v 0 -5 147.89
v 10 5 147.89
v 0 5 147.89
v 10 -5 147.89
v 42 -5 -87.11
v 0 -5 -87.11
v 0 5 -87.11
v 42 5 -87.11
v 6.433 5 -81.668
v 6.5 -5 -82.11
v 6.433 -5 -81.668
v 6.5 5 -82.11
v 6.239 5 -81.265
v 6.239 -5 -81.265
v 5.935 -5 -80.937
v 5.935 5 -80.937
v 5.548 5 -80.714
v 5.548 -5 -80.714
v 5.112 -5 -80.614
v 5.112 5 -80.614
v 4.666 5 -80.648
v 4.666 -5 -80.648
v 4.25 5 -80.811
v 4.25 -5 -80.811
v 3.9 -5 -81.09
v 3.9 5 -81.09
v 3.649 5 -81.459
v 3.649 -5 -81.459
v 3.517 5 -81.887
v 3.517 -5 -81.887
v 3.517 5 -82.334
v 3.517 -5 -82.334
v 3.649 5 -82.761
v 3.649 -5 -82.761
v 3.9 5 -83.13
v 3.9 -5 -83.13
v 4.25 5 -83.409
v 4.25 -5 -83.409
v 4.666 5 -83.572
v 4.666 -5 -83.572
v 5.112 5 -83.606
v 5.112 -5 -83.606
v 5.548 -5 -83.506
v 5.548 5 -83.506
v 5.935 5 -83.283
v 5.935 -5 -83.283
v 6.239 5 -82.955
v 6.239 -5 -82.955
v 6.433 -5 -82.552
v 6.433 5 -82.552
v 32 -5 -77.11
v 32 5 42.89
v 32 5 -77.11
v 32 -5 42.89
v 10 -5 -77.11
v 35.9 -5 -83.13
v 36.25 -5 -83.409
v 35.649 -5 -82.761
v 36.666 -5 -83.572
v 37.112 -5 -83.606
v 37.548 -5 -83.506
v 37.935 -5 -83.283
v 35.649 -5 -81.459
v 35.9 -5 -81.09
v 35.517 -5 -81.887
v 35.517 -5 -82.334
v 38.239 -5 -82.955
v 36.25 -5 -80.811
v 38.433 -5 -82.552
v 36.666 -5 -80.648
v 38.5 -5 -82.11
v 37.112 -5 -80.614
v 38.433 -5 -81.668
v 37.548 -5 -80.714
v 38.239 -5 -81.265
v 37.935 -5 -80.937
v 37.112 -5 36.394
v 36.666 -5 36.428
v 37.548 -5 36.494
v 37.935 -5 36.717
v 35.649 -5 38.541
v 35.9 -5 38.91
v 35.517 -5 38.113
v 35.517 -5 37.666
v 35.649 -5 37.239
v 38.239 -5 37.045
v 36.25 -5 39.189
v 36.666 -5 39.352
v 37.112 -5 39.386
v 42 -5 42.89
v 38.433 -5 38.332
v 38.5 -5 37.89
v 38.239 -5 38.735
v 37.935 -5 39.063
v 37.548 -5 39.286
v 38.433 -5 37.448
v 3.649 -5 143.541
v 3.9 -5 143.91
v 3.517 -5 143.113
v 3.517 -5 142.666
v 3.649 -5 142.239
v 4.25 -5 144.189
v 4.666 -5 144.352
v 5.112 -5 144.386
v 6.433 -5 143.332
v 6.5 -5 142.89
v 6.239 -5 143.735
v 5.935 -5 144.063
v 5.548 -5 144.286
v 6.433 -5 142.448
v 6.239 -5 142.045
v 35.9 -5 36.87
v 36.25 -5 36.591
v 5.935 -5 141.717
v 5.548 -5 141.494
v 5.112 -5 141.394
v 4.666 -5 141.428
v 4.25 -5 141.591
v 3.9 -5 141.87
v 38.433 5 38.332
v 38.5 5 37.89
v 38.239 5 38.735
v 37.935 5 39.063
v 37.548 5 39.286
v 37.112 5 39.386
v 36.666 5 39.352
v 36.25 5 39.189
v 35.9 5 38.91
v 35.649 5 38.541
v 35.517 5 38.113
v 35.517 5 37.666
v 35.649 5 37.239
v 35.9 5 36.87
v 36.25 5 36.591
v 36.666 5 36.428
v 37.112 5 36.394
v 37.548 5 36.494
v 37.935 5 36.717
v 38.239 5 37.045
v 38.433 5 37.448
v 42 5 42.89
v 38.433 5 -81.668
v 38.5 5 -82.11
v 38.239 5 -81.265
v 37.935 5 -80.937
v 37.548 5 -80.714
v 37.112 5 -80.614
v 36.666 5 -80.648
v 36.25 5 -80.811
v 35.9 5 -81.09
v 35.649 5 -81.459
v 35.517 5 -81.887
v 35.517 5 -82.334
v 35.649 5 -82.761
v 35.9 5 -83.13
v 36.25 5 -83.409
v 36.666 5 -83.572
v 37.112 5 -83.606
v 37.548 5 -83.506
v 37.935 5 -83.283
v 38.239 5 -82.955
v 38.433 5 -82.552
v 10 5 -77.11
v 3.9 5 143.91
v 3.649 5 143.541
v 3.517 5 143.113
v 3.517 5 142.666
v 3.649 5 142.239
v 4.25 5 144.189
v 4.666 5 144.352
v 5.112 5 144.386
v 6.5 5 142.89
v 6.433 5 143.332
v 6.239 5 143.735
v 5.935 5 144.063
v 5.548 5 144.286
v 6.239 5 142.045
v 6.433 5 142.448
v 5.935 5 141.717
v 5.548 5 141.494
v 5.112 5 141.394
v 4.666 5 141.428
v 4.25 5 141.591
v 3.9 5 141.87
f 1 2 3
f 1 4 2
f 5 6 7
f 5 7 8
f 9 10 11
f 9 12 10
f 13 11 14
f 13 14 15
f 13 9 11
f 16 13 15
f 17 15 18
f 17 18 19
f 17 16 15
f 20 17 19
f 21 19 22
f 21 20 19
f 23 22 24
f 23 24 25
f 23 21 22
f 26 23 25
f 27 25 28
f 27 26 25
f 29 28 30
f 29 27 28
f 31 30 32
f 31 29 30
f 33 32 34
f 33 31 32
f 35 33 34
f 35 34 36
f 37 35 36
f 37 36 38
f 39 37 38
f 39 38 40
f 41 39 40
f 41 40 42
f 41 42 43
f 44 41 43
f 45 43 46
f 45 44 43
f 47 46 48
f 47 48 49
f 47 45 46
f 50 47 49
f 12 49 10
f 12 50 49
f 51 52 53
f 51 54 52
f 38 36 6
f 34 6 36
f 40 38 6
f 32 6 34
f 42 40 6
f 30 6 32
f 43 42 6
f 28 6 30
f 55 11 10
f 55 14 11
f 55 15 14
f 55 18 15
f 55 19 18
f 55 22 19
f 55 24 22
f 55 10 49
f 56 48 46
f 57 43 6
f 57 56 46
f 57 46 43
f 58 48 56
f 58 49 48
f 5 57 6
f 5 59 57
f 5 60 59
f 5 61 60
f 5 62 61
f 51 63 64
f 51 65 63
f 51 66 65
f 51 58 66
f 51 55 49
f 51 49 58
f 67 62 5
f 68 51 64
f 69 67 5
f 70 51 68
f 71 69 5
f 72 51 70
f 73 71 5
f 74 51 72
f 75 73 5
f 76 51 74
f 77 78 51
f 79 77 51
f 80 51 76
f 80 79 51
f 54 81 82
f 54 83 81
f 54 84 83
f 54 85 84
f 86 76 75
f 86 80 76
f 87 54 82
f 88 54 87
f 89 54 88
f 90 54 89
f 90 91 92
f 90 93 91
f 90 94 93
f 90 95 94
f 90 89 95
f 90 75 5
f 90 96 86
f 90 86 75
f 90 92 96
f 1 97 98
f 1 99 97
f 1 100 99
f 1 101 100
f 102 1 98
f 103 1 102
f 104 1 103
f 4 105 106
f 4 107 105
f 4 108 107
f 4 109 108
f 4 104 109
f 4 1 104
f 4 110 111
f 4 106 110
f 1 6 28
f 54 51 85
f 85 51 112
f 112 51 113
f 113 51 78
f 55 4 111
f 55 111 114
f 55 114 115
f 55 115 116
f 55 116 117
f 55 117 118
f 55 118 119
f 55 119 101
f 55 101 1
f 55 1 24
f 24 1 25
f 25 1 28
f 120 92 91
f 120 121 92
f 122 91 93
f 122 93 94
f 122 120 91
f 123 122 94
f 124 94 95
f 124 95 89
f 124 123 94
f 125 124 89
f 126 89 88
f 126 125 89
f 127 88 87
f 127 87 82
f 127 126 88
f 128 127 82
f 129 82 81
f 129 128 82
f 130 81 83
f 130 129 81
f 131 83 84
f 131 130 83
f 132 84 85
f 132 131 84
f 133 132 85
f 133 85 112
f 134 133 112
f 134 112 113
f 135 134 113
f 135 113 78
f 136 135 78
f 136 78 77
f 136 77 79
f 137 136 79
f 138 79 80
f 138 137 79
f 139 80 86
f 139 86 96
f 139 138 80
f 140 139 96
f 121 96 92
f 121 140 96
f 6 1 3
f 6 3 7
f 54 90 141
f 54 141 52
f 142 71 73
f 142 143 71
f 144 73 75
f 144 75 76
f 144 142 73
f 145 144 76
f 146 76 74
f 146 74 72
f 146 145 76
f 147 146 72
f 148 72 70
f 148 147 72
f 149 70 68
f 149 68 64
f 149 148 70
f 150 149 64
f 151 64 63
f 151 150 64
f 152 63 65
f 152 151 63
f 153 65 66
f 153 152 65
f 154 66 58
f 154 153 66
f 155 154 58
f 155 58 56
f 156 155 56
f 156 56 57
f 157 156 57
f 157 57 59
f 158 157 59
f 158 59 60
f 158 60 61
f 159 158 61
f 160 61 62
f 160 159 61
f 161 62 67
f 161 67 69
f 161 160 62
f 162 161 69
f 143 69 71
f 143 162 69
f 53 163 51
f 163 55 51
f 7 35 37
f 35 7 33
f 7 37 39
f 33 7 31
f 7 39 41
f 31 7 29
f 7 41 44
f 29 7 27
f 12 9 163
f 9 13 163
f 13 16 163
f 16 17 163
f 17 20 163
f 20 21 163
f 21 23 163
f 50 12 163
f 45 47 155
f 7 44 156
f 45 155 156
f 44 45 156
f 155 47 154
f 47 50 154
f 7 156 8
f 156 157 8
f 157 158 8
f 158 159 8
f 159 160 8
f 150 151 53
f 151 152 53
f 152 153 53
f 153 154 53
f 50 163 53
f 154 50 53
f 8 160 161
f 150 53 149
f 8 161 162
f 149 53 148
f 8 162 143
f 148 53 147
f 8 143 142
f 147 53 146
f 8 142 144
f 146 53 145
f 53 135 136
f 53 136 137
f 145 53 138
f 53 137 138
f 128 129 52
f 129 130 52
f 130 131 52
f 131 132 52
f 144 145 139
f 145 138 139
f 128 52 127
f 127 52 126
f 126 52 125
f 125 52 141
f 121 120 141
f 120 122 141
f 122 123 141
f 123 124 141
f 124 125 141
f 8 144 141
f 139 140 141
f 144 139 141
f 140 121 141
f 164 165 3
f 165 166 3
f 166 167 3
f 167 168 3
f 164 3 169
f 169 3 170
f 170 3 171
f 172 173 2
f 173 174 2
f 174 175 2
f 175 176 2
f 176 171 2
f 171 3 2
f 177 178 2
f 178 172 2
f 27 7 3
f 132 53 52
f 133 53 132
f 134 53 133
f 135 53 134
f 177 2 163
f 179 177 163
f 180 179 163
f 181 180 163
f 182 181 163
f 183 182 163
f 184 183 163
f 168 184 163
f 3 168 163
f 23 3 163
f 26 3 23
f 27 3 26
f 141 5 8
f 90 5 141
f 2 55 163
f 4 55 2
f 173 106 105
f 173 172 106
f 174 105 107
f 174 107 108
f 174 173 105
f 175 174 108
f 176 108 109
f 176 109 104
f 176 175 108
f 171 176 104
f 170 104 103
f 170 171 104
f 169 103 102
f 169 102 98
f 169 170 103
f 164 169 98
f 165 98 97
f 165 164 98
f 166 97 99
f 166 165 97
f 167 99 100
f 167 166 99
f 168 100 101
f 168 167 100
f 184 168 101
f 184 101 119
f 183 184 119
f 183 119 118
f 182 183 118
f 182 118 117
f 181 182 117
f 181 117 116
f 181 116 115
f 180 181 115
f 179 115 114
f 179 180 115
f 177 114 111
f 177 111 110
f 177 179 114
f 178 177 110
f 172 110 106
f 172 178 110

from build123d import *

# Parameters (mm, degrees)
F0_R     = 1.5
F0_W     = 22
F0_H     = 10
F1_DEPTH = 5
F2_DEPTH = 5


# Not quite as in the source:
# - a feature names something its author has since deleted; it is built from what else it names


with BuildPart() as f1:
    # F0 (on Front) → F1 (new body, symmetric)
    with BuildSketch(Plane.XZ):
        Polygon((10, 147.8899265081), (0, 147.8899265081), (0, -87.1100734919), (10, -87.1100734919), (10, -77.1100734919), align=None)
        with Locations((5, -82.1100734919)):
            Circle(F0_R, mode=Mode.SUBTRACT)
        with Locations((5, 142.8899265081)):
            Circle(F0_R, mode=Mode.SUBTRACT)
        with Locations((21, -82.1100734919)):
            Rectangle(F0_W, F0_H)
        Polygon((32, 42.8899265081), (32, -77.1100734919), (32, -87.1100734919), (42, -87.1100734919), (42, 42.8899265081), align=None)
        with Locations((37, -82.1100734919)):
            Circle(F0_R, mode=Mode.SUBTRACT)
        with Locations((37, 37.8899265081)):
            Circle(F0_R, mode=Mode.SUBTRACT)
    extrude(amount=F1_DEPTH, both=True)

    # F0 (on Front) → F2 (cut, symmetric)
    with BuildSketch(Plane.XZ):
        with Locations((5, -82.1100734919)):
            Circle(F0_R)
        with Locations((37, -82.1100734919)):
            Circle(F0_R)
        with Locations((37, 37.8899265081)):
            Circle(F0_R)
        with Locations((5, 142.8899265081)):
            Circle(F0_R)
    extrude(amount=F2_DEPTH, both=True, mode=Mode.SUBTRACT)


solid = f1.part
